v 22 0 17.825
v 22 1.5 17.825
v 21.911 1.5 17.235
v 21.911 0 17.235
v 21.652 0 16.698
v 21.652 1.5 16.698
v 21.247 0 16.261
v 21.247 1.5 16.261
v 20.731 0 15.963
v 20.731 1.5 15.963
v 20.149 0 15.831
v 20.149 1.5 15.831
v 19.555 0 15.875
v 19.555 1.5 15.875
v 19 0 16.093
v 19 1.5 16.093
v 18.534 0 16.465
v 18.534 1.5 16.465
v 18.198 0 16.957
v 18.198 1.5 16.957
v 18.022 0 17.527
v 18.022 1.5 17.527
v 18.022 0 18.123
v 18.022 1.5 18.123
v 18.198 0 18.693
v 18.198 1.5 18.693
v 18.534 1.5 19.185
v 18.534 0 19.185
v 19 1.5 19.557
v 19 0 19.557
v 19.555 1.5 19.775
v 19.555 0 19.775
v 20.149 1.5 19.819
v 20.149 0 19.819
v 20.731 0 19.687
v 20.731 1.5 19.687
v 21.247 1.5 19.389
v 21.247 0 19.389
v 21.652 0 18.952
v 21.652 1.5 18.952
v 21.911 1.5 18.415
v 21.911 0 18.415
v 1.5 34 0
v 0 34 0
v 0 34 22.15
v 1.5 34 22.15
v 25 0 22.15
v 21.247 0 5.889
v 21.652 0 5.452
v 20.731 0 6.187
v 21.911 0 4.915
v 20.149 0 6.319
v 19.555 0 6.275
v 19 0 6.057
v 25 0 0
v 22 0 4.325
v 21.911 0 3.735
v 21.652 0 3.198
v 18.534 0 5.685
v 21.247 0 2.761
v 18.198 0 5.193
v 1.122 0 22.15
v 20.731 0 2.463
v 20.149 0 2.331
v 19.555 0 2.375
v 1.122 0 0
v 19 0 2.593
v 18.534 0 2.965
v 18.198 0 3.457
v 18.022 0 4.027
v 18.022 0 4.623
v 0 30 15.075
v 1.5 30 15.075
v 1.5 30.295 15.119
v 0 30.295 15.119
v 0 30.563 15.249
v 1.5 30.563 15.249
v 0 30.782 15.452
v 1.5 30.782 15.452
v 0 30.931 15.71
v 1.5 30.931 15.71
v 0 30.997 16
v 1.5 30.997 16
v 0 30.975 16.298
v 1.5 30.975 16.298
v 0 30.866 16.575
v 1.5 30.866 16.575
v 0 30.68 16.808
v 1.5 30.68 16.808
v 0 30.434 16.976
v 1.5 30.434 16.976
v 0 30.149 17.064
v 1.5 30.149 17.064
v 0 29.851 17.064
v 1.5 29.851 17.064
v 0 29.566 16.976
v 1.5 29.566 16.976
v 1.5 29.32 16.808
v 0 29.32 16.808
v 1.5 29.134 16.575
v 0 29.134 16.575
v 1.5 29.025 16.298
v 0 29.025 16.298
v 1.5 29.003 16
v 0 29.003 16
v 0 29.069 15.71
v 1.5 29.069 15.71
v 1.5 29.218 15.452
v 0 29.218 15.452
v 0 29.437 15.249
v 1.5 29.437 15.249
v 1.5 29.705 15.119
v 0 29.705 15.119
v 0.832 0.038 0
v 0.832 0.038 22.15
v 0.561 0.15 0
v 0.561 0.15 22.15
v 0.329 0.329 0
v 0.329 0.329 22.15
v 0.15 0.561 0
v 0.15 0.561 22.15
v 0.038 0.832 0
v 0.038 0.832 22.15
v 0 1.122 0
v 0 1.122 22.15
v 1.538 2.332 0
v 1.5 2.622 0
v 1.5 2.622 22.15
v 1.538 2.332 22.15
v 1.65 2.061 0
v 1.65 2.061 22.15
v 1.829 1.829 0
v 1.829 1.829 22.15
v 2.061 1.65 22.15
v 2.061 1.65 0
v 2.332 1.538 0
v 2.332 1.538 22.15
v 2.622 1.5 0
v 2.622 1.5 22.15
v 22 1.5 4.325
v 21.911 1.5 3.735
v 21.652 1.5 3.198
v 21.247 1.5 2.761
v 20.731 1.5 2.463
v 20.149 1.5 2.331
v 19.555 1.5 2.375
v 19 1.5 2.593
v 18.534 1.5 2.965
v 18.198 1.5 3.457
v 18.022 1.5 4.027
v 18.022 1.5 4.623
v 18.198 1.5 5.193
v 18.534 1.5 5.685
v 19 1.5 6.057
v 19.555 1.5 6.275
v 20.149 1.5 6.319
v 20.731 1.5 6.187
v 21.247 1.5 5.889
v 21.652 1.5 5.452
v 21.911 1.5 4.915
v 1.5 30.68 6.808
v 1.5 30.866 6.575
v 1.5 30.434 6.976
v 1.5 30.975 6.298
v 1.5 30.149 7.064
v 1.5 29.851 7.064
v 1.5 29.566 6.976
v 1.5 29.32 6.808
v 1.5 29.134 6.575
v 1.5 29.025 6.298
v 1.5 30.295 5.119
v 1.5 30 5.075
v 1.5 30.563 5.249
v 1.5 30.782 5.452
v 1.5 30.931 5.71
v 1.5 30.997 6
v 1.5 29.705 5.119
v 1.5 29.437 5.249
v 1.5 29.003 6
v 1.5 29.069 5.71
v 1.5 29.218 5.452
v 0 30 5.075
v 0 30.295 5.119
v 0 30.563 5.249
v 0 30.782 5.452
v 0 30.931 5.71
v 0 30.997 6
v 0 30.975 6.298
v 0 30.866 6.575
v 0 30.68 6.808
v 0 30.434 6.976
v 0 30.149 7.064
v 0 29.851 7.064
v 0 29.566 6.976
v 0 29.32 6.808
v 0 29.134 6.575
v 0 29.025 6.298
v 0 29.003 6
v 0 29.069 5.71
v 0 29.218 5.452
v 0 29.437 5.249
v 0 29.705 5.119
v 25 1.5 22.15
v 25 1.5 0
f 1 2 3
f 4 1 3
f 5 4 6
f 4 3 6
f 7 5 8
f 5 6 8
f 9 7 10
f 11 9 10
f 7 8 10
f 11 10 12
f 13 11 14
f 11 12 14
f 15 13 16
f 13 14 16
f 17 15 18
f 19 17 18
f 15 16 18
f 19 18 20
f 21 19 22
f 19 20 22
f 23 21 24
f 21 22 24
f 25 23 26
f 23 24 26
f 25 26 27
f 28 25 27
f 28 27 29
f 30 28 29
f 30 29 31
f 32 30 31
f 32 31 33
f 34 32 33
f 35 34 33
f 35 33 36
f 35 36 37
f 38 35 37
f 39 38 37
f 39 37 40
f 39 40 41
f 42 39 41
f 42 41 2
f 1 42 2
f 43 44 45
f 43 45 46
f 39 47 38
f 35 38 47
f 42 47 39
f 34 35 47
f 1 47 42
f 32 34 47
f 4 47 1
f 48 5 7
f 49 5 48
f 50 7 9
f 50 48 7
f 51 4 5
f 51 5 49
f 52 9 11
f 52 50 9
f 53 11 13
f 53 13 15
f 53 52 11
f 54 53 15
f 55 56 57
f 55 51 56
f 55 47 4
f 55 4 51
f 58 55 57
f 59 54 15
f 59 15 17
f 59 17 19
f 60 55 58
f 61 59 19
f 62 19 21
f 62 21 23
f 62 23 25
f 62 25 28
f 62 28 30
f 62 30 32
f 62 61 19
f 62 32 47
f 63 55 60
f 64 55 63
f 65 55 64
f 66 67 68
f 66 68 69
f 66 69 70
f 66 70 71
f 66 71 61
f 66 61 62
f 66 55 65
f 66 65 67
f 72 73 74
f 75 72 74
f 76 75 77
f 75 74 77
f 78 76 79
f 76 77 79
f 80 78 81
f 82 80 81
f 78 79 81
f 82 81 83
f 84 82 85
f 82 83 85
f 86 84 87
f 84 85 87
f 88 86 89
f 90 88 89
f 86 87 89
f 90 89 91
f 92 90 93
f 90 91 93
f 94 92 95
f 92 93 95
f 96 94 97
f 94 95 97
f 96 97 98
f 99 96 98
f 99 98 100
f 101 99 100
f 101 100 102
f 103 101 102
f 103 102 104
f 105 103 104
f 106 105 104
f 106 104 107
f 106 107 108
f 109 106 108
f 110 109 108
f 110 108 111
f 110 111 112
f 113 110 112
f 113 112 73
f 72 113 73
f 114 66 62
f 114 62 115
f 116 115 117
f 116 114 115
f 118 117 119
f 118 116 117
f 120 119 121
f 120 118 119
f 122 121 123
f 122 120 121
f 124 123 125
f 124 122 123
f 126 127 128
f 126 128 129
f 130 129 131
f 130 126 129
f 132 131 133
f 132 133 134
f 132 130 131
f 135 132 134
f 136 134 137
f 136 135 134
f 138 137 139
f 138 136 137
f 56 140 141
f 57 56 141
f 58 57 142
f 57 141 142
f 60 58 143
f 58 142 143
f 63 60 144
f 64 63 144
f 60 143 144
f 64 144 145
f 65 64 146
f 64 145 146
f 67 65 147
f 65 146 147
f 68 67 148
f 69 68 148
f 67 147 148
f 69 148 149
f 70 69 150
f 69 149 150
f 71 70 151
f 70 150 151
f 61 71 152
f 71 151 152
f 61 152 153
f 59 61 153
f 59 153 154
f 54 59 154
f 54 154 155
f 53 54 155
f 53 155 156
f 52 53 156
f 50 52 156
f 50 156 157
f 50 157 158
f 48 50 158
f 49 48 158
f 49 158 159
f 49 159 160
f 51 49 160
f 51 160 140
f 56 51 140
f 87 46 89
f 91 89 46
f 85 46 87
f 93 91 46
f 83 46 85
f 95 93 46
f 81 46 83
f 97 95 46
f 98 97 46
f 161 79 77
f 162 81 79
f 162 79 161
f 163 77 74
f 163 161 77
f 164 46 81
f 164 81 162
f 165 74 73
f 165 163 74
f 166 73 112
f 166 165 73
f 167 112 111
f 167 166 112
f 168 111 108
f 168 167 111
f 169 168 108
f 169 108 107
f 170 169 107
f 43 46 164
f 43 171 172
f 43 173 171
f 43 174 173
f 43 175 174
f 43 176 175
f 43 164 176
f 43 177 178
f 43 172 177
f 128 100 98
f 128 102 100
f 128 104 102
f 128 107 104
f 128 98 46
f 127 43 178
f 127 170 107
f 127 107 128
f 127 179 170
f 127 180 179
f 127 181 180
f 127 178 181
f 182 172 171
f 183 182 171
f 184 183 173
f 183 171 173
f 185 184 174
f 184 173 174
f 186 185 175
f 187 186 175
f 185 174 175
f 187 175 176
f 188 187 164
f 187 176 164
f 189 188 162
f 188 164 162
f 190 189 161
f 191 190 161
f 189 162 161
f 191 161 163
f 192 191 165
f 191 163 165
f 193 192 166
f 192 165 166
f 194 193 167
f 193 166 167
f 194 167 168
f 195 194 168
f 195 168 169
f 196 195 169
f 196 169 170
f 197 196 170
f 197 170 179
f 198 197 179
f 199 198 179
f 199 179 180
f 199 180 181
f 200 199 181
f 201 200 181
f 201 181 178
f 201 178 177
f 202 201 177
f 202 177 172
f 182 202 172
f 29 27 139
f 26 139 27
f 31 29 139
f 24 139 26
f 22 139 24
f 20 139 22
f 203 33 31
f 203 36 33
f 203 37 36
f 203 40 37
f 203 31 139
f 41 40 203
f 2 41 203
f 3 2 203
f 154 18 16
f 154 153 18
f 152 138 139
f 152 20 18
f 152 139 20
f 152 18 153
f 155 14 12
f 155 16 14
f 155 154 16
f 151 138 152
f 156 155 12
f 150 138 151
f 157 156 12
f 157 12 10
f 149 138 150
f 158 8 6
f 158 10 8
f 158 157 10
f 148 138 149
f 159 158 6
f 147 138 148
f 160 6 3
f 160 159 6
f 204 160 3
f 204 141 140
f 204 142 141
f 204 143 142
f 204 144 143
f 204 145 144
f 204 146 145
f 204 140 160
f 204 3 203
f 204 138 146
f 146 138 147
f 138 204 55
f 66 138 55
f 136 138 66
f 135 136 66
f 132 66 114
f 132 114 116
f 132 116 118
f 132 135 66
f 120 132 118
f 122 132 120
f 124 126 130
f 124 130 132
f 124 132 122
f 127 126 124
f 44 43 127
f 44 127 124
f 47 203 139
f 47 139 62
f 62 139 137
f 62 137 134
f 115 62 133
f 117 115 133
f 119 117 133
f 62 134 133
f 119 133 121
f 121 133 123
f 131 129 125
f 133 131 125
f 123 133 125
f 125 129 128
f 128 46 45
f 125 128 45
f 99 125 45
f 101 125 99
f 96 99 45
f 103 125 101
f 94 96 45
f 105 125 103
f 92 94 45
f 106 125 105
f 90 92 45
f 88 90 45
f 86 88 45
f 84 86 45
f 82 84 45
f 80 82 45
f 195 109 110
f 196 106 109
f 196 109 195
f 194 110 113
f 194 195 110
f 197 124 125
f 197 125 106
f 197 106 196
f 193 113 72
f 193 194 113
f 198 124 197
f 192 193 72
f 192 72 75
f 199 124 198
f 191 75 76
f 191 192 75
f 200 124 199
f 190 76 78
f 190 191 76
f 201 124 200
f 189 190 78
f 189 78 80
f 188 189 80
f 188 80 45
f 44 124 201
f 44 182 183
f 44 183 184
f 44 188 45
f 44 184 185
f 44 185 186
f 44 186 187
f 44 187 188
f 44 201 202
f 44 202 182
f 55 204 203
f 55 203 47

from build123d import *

# Parameters (mm, degrees)
BOSS_EXTRU_1_DEPTH      = 22.15
ESQUISSE2_R             = 2
ENL_V_MAT_EXTRU_1_DEPTH = 2.5
ESQUISSE3_R             = 1
ENL_V_MAT_EXTRU_2_DEPTH = 2.5


with BuildPart() as part:
    # Esquisse1 → Boss.-Extru.1 (new body)
    with BuildSketch(Plane.XY):
        with BuildLine():
            Line((0, 1.122291019), (0, 34))
            Line((0, 34), (1.5, 34))
            Line((1.5, 34), (1.5, 2.622291019))
            ThreePointArc((1.5, 2.622291019), (1.828711429, 1.828711429), (2.622291019, 1.5))
            Line((2.622291019, 1.5), (25, 1.5))
            Line((25, 1.5), (25, 0))
            Line((25, 0), (1.122291019, 0))
            ThreePointArc((1.122291019, 0), (0.328711429, 0.328711429), (0, 1.122291019))
        make_face()
    extrude(amount=BOSS_EXTRU_1_DEPTH)

    # Esquisse2 → Enlèv. mat.-Extru.1 (cut, through all)
    with BuildSketch(Plane(origin=(0, 1.5, 0), x_dir=(1, 0, 0), z_dir=(0, 1, 0))):
        with Locations((20, -4.325)):
            Circle(ESQUISSE2_R)
        with Locations((20, -17.825)):
            Circle(ESQUISSE2_R)
    extrude(amount=-ENL_V_MAT_EXTRU_1_DEPTH, mode=Mode.SUBTRACT)

    # Esquisse3 → Enlèv. mat.-Extru.2 (cut, through all)
    with BuildSketch(Plane(origin=(1.5, 0, 0), x_dir=(0, 0, -1), z_dir=(1, 0, 0))):
        with Locations((-16.075, 30)):
            Circle(ESQUISSE3_R)
        with Locations((-6.075, 30)):
            Circle(ESQUISSE3_R)
    extrude(amount=-ENL_V_MAT_EXTRU_2_DEPTH, mode=Mode.SUBTRACT)


solid = part.part
